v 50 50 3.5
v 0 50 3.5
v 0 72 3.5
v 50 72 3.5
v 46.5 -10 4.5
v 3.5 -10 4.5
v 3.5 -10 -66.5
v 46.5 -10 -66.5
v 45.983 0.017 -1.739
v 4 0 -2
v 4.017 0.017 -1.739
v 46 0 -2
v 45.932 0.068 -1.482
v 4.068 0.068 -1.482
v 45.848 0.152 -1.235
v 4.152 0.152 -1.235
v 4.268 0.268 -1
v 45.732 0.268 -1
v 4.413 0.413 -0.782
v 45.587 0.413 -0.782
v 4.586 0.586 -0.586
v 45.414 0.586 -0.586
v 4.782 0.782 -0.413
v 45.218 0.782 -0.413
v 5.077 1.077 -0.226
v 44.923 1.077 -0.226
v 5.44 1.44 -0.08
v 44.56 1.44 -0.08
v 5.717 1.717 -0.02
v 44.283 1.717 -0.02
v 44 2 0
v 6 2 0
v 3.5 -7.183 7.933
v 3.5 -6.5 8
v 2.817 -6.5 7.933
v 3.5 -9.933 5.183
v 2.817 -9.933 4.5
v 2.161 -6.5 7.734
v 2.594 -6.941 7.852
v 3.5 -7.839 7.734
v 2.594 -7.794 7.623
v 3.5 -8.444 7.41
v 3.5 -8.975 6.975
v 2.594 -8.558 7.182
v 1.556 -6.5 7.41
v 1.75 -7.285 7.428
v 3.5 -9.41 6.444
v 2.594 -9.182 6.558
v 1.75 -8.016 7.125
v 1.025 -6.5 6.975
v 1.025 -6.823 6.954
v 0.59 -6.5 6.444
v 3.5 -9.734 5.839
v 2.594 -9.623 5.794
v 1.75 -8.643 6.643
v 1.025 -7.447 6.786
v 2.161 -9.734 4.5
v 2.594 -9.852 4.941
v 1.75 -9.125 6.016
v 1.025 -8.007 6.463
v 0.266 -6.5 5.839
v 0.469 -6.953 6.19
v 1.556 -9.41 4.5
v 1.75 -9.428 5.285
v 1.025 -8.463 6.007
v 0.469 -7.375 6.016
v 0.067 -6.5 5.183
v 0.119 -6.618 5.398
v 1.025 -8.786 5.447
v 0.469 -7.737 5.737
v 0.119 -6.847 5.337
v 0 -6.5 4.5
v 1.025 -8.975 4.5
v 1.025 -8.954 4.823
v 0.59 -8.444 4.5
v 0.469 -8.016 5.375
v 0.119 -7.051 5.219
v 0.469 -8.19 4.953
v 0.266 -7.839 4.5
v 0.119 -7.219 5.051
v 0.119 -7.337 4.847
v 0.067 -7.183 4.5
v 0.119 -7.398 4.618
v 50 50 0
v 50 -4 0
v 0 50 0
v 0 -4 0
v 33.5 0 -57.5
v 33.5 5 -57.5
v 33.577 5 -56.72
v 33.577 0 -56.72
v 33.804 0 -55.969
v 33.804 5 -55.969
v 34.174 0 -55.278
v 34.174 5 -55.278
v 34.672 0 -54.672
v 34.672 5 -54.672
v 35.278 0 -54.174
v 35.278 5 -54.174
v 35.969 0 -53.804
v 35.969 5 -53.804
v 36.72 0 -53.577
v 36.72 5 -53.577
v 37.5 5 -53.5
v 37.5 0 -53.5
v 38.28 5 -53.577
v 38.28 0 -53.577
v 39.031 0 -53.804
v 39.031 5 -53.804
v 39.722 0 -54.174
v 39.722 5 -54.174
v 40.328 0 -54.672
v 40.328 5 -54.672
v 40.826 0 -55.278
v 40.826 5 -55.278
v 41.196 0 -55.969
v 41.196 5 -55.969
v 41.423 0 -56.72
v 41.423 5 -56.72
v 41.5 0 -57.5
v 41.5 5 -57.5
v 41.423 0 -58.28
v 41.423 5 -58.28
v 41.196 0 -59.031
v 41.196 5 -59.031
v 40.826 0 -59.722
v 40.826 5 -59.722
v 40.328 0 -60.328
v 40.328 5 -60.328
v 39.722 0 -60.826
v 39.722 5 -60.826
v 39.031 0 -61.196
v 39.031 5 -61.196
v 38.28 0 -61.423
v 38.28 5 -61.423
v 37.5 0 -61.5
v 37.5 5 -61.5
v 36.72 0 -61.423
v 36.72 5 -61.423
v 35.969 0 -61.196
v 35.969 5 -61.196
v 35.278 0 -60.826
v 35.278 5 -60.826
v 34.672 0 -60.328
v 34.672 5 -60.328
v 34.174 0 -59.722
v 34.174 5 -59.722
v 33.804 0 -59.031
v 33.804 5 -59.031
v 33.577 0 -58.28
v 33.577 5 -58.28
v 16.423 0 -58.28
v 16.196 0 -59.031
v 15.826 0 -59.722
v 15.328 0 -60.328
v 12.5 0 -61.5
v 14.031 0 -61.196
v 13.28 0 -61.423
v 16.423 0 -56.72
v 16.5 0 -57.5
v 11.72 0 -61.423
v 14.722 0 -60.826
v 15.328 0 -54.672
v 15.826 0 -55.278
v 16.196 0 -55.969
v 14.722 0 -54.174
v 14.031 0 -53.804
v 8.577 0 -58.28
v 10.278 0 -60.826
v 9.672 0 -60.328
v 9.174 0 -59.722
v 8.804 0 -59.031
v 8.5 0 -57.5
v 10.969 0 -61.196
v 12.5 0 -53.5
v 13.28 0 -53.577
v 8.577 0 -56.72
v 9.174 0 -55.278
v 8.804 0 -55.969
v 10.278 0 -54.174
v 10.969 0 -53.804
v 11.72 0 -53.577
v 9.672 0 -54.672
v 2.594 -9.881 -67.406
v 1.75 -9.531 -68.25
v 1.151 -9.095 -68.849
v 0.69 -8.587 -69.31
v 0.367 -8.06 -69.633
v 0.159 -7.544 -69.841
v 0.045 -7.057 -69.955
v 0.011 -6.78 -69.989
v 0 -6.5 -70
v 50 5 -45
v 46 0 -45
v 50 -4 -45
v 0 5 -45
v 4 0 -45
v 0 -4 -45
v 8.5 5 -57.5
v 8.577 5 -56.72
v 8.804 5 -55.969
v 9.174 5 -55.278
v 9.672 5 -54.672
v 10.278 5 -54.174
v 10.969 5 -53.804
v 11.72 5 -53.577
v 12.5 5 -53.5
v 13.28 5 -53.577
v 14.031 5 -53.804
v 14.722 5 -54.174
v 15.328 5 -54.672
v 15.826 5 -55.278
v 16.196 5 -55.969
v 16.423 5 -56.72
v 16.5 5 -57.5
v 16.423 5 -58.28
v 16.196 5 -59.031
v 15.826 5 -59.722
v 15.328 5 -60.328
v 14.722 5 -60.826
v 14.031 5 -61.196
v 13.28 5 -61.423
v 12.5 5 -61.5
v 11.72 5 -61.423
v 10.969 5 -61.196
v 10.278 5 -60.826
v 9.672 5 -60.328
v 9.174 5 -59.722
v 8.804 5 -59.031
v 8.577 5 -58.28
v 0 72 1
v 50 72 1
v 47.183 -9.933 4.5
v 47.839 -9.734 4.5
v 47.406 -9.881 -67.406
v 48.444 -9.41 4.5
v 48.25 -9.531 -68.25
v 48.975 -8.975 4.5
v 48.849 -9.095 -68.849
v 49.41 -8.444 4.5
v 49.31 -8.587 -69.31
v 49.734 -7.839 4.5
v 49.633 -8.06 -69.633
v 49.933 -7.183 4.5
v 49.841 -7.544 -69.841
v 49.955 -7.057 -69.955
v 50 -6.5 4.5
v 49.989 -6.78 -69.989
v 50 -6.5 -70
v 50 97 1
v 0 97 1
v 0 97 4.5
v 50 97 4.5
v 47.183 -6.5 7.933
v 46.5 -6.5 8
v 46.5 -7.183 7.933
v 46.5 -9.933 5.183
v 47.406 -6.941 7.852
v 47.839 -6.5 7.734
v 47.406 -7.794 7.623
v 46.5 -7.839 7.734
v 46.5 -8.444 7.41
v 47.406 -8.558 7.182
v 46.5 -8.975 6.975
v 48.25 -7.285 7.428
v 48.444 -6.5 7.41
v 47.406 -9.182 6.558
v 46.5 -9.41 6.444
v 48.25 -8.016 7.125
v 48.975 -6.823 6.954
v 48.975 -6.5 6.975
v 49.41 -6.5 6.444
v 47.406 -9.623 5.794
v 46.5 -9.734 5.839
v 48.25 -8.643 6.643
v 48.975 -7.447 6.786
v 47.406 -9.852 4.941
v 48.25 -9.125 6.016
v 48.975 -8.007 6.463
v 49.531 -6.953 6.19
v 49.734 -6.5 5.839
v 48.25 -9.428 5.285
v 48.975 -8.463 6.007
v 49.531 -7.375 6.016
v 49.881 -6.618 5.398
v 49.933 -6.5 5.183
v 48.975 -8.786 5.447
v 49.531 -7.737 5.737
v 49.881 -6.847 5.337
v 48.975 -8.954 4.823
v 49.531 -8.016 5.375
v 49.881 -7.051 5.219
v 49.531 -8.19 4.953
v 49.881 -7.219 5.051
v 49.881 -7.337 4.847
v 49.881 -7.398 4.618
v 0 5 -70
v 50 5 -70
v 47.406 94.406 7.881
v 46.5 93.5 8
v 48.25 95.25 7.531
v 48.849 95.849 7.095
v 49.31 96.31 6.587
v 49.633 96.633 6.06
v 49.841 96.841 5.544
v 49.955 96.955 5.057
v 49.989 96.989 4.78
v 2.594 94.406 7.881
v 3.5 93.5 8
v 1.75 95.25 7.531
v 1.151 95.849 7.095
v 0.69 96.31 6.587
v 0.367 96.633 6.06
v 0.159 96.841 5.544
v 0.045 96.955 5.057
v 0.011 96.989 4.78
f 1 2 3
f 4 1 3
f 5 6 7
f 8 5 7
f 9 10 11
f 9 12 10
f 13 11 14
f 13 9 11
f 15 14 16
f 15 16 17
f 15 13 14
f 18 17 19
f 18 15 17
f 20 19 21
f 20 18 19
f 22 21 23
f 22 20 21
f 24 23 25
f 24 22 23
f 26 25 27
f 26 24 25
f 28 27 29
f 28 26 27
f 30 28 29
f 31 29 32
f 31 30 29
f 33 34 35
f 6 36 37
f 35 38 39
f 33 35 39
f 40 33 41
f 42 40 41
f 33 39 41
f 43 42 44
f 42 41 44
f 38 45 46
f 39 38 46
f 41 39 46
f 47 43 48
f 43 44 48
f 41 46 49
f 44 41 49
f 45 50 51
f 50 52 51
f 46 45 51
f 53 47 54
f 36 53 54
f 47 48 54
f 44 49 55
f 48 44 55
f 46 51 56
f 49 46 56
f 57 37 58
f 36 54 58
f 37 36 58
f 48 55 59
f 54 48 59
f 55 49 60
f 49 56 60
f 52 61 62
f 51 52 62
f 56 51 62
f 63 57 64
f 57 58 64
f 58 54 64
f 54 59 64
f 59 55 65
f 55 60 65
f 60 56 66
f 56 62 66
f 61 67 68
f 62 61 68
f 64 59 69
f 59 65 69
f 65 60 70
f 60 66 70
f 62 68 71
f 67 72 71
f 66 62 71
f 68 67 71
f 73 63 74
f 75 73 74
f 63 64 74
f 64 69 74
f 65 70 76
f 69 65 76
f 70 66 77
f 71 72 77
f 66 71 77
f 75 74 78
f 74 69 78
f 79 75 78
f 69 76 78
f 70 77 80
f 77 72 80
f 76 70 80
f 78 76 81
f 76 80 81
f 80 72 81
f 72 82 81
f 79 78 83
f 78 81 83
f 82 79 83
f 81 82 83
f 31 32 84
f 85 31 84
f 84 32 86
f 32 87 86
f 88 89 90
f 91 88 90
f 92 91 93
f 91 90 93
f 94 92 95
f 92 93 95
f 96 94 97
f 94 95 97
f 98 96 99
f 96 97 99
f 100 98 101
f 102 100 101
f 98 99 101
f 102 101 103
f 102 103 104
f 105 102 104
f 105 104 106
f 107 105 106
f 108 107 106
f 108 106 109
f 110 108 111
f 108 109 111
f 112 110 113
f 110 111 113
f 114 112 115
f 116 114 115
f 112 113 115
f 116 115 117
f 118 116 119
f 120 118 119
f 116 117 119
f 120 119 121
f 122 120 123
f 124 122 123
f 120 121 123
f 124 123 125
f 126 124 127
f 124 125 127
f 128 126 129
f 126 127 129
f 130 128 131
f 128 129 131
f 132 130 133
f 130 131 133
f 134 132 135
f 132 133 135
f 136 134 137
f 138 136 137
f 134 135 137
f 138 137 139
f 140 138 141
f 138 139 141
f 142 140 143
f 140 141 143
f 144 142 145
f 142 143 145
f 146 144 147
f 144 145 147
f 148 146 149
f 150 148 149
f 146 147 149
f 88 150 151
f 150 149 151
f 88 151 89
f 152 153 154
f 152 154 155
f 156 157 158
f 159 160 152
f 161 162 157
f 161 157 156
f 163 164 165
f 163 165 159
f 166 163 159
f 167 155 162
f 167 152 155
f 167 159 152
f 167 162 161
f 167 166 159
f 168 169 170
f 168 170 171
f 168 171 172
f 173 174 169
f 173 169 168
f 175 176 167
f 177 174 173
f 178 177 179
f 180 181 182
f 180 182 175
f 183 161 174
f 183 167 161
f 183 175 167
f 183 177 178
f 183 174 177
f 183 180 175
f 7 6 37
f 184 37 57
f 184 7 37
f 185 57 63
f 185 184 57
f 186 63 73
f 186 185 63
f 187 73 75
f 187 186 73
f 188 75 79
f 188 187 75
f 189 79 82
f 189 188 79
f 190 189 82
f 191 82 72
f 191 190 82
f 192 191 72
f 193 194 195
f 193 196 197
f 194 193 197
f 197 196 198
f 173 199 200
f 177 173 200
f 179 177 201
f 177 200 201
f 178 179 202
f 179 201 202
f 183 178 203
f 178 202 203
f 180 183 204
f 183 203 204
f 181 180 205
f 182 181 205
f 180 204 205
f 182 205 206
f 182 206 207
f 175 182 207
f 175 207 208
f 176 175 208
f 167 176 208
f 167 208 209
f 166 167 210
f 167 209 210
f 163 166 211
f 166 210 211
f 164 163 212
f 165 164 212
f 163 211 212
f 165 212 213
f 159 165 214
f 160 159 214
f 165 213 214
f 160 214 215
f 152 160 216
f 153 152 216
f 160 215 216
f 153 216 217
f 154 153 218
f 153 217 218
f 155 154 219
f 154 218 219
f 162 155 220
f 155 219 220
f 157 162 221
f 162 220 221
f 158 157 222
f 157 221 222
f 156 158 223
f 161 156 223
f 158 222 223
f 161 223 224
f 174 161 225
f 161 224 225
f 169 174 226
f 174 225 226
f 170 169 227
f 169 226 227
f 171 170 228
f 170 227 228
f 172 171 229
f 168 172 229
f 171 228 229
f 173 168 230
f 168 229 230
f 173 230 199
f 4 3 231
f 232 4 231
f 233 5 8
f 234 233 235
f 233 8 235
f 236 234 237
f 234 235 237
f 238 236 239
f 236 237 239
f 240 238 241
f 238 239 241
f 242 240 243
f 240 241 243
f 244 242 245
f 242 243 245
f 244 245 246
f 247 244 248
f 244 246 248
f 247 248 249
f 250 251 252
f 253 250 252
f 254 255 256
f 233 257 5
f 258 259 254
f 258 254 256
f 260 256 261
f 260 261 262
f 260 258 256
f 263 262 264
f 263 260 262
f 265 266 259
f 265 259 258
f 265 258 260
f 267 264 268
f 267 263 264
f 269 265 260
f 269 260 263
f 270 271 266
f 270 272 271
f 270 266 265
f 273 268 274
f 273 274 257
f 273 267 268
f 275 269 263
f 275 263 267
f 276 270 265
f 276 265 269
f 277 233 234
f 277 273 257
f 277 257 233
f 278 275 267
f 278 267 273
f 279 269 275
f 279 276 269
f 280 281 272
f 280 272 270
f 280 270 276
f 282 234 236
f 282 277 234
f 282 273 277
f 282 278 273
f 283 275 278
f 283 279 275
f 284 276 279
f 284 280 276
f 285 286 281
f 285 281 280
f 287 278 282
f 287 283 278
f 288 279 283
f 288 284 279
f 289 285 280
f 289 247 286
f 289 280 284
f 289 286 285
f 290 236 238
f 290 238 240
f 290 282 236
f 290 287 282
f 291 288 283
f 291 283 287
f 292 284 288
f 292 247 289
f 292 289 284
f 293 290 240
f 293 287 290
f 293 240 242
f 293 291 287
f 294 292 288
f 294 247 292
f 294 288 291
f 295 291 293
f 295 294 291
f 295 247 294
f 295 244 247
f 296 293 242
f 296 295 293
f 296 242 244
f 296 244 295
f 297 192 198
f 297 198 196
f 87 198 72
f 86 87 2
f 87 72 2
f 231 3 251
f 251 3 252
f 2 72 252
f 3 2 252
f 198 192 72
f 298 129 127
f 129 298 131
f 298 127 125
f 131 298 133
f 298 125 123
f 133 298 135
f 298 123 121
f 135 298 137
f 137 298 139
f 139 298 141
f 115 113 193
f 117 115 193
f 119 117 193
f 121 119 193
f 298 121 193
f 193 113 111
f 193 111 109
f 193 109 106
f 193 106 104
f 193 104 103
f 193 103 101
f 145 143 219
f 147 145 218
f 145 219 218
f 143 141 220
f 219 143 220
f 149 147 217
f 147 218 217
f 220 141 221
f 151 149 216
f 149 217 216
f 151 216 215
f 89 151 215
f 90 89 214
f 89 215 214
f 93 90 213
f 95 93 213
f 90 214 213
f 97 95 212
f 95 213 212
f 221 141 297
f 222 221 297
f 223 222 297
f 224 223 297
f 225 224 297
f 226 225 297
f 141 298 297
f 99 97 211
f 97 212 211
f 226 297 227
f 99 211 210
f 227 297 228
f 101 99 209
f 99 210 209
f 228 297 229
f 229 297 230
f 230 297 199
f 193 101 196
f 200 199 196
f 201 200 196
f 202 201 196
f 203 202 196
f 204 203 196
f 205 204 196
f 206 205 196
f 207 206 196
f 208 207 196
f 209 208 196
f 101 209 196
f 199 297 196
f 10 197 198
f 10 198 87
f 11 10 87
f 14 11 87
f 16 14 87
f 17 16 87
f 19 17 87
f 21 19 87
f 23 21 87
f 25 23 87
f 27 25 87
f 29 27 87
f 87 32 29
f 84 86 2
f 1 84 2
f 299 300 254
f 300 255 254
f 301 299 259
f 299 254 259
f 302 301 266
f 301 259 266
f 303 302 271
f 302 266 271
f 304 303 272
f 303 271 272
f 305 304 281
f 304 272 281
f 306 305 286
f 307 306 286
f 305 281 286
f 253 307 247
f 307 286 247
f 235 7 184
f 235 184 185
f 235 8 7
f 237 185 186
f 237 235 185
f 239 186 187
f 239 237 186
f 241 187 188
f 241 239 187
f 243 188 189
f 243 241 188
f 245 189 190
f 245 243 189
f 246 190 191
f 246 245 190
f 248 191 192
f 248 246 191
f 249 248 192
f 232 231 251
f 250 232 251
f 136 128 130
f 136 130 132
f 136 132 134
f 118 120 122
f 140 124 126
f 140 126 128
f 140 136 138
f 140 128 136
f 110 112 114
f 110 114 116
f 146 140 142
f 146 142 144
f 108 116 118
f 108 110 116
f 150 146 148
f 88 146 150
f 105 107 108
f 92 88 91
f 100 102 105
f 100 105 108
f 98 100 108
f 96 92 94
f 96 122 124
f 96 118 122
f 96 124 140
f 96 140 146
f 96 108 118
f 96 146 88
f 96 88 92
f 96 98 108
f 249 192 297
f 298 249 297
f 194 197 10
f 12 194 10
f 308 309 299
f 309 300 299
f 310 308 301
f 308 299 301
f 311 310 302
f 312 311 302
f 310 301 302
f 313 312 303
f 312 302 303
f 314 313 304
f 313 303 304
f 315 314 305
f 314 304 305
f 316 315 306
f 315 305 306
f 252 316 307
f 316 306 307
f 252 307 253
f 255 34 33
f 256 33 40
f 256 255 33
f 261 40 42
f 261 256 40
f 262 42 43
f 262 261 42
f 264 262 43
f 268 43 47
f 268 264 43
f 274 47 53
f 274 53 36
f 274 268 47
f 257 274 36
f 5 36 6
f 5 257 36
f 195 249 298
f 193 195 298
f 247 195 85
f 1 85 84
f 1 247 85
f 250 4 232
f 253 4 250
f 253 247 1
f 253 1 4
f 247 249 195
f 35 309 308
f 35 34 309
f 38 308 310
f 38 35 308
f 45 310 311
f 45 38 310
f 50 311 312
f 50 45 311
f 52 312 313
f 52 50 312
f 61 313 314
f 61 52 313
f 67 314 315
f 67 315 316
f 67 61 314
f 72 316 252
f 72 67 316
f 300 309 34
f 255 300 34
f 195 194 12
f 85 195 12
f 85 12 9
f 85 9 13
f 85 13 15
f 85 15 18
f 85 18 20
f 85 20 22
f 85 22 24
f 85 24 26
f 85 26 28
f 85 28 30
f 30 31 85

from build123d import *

# Parameters (mm, degrees)
F1_DEPTH = 50
F2_R     = 3.5
F3_R     = 3.5
F4_R     = 4
F5_DEPTH = 5
F6_SIZE  = 4
F7_R     = 2


with BuildPart() as f1:
    # F0 (on Right) → F1 (new body)
    with BuildSketch(Plane.YZ):
        Polygon((97, 8), (-10, 8), (-10, -70), (5, -70), (5, -45), (0, -45), (0, 0), (50, 0), (50, 3.5), (72, 3.5), (72, 1), (97, 1), align=None)
    extrude(amount=F1_DEPTH)

    # F2
    f2_edges = [f1.edges().sort_by_distance(p)[0] for p in [
        (25, -10, 8),
    ]]
    fillet(f2_edges, radius=F2_R)

    # F3
    f3_edges = [f1.edges().sort_by_distance(p)[0] for p in [
        (50, 45.25, 8),
        (25, 97, 8),
        (0, 45.25, 8),
        (25, -10, -70),
    ]]
    fillet(f3_edges, radius=F3_R)

    # F4 (on face) → F5 (cut)
    with BuildSketch(Plane(origin=(0, 5, 0), x_dir=(-1, 0, 0), z_dir=(0, 1, 0))):
        with Locations((-37.5, -57.5)):
            Circle(F4_R)
        with Locations((-12.5, -57.5)):
            Circle(F4_R)
    extrude(amount=-F5_DEPTH, mode=Mode.SUBTRACT)

    # F6
    f6_edges = [f1.edges().sort_by_distance(p)[0] for p in [
        (50, 0, -22.5),
        (0, 0, -22.5),
    ]]
    chamfer(f6_edges, length=F6_SIZE)

    # F7
    f7_edges = [f1.edges().sort_by_distance(p)[0] for p in [
        (25, 0, 0),
    ]]
    fillet(f7_edges, radius=F7_R)


solid = f1.part
